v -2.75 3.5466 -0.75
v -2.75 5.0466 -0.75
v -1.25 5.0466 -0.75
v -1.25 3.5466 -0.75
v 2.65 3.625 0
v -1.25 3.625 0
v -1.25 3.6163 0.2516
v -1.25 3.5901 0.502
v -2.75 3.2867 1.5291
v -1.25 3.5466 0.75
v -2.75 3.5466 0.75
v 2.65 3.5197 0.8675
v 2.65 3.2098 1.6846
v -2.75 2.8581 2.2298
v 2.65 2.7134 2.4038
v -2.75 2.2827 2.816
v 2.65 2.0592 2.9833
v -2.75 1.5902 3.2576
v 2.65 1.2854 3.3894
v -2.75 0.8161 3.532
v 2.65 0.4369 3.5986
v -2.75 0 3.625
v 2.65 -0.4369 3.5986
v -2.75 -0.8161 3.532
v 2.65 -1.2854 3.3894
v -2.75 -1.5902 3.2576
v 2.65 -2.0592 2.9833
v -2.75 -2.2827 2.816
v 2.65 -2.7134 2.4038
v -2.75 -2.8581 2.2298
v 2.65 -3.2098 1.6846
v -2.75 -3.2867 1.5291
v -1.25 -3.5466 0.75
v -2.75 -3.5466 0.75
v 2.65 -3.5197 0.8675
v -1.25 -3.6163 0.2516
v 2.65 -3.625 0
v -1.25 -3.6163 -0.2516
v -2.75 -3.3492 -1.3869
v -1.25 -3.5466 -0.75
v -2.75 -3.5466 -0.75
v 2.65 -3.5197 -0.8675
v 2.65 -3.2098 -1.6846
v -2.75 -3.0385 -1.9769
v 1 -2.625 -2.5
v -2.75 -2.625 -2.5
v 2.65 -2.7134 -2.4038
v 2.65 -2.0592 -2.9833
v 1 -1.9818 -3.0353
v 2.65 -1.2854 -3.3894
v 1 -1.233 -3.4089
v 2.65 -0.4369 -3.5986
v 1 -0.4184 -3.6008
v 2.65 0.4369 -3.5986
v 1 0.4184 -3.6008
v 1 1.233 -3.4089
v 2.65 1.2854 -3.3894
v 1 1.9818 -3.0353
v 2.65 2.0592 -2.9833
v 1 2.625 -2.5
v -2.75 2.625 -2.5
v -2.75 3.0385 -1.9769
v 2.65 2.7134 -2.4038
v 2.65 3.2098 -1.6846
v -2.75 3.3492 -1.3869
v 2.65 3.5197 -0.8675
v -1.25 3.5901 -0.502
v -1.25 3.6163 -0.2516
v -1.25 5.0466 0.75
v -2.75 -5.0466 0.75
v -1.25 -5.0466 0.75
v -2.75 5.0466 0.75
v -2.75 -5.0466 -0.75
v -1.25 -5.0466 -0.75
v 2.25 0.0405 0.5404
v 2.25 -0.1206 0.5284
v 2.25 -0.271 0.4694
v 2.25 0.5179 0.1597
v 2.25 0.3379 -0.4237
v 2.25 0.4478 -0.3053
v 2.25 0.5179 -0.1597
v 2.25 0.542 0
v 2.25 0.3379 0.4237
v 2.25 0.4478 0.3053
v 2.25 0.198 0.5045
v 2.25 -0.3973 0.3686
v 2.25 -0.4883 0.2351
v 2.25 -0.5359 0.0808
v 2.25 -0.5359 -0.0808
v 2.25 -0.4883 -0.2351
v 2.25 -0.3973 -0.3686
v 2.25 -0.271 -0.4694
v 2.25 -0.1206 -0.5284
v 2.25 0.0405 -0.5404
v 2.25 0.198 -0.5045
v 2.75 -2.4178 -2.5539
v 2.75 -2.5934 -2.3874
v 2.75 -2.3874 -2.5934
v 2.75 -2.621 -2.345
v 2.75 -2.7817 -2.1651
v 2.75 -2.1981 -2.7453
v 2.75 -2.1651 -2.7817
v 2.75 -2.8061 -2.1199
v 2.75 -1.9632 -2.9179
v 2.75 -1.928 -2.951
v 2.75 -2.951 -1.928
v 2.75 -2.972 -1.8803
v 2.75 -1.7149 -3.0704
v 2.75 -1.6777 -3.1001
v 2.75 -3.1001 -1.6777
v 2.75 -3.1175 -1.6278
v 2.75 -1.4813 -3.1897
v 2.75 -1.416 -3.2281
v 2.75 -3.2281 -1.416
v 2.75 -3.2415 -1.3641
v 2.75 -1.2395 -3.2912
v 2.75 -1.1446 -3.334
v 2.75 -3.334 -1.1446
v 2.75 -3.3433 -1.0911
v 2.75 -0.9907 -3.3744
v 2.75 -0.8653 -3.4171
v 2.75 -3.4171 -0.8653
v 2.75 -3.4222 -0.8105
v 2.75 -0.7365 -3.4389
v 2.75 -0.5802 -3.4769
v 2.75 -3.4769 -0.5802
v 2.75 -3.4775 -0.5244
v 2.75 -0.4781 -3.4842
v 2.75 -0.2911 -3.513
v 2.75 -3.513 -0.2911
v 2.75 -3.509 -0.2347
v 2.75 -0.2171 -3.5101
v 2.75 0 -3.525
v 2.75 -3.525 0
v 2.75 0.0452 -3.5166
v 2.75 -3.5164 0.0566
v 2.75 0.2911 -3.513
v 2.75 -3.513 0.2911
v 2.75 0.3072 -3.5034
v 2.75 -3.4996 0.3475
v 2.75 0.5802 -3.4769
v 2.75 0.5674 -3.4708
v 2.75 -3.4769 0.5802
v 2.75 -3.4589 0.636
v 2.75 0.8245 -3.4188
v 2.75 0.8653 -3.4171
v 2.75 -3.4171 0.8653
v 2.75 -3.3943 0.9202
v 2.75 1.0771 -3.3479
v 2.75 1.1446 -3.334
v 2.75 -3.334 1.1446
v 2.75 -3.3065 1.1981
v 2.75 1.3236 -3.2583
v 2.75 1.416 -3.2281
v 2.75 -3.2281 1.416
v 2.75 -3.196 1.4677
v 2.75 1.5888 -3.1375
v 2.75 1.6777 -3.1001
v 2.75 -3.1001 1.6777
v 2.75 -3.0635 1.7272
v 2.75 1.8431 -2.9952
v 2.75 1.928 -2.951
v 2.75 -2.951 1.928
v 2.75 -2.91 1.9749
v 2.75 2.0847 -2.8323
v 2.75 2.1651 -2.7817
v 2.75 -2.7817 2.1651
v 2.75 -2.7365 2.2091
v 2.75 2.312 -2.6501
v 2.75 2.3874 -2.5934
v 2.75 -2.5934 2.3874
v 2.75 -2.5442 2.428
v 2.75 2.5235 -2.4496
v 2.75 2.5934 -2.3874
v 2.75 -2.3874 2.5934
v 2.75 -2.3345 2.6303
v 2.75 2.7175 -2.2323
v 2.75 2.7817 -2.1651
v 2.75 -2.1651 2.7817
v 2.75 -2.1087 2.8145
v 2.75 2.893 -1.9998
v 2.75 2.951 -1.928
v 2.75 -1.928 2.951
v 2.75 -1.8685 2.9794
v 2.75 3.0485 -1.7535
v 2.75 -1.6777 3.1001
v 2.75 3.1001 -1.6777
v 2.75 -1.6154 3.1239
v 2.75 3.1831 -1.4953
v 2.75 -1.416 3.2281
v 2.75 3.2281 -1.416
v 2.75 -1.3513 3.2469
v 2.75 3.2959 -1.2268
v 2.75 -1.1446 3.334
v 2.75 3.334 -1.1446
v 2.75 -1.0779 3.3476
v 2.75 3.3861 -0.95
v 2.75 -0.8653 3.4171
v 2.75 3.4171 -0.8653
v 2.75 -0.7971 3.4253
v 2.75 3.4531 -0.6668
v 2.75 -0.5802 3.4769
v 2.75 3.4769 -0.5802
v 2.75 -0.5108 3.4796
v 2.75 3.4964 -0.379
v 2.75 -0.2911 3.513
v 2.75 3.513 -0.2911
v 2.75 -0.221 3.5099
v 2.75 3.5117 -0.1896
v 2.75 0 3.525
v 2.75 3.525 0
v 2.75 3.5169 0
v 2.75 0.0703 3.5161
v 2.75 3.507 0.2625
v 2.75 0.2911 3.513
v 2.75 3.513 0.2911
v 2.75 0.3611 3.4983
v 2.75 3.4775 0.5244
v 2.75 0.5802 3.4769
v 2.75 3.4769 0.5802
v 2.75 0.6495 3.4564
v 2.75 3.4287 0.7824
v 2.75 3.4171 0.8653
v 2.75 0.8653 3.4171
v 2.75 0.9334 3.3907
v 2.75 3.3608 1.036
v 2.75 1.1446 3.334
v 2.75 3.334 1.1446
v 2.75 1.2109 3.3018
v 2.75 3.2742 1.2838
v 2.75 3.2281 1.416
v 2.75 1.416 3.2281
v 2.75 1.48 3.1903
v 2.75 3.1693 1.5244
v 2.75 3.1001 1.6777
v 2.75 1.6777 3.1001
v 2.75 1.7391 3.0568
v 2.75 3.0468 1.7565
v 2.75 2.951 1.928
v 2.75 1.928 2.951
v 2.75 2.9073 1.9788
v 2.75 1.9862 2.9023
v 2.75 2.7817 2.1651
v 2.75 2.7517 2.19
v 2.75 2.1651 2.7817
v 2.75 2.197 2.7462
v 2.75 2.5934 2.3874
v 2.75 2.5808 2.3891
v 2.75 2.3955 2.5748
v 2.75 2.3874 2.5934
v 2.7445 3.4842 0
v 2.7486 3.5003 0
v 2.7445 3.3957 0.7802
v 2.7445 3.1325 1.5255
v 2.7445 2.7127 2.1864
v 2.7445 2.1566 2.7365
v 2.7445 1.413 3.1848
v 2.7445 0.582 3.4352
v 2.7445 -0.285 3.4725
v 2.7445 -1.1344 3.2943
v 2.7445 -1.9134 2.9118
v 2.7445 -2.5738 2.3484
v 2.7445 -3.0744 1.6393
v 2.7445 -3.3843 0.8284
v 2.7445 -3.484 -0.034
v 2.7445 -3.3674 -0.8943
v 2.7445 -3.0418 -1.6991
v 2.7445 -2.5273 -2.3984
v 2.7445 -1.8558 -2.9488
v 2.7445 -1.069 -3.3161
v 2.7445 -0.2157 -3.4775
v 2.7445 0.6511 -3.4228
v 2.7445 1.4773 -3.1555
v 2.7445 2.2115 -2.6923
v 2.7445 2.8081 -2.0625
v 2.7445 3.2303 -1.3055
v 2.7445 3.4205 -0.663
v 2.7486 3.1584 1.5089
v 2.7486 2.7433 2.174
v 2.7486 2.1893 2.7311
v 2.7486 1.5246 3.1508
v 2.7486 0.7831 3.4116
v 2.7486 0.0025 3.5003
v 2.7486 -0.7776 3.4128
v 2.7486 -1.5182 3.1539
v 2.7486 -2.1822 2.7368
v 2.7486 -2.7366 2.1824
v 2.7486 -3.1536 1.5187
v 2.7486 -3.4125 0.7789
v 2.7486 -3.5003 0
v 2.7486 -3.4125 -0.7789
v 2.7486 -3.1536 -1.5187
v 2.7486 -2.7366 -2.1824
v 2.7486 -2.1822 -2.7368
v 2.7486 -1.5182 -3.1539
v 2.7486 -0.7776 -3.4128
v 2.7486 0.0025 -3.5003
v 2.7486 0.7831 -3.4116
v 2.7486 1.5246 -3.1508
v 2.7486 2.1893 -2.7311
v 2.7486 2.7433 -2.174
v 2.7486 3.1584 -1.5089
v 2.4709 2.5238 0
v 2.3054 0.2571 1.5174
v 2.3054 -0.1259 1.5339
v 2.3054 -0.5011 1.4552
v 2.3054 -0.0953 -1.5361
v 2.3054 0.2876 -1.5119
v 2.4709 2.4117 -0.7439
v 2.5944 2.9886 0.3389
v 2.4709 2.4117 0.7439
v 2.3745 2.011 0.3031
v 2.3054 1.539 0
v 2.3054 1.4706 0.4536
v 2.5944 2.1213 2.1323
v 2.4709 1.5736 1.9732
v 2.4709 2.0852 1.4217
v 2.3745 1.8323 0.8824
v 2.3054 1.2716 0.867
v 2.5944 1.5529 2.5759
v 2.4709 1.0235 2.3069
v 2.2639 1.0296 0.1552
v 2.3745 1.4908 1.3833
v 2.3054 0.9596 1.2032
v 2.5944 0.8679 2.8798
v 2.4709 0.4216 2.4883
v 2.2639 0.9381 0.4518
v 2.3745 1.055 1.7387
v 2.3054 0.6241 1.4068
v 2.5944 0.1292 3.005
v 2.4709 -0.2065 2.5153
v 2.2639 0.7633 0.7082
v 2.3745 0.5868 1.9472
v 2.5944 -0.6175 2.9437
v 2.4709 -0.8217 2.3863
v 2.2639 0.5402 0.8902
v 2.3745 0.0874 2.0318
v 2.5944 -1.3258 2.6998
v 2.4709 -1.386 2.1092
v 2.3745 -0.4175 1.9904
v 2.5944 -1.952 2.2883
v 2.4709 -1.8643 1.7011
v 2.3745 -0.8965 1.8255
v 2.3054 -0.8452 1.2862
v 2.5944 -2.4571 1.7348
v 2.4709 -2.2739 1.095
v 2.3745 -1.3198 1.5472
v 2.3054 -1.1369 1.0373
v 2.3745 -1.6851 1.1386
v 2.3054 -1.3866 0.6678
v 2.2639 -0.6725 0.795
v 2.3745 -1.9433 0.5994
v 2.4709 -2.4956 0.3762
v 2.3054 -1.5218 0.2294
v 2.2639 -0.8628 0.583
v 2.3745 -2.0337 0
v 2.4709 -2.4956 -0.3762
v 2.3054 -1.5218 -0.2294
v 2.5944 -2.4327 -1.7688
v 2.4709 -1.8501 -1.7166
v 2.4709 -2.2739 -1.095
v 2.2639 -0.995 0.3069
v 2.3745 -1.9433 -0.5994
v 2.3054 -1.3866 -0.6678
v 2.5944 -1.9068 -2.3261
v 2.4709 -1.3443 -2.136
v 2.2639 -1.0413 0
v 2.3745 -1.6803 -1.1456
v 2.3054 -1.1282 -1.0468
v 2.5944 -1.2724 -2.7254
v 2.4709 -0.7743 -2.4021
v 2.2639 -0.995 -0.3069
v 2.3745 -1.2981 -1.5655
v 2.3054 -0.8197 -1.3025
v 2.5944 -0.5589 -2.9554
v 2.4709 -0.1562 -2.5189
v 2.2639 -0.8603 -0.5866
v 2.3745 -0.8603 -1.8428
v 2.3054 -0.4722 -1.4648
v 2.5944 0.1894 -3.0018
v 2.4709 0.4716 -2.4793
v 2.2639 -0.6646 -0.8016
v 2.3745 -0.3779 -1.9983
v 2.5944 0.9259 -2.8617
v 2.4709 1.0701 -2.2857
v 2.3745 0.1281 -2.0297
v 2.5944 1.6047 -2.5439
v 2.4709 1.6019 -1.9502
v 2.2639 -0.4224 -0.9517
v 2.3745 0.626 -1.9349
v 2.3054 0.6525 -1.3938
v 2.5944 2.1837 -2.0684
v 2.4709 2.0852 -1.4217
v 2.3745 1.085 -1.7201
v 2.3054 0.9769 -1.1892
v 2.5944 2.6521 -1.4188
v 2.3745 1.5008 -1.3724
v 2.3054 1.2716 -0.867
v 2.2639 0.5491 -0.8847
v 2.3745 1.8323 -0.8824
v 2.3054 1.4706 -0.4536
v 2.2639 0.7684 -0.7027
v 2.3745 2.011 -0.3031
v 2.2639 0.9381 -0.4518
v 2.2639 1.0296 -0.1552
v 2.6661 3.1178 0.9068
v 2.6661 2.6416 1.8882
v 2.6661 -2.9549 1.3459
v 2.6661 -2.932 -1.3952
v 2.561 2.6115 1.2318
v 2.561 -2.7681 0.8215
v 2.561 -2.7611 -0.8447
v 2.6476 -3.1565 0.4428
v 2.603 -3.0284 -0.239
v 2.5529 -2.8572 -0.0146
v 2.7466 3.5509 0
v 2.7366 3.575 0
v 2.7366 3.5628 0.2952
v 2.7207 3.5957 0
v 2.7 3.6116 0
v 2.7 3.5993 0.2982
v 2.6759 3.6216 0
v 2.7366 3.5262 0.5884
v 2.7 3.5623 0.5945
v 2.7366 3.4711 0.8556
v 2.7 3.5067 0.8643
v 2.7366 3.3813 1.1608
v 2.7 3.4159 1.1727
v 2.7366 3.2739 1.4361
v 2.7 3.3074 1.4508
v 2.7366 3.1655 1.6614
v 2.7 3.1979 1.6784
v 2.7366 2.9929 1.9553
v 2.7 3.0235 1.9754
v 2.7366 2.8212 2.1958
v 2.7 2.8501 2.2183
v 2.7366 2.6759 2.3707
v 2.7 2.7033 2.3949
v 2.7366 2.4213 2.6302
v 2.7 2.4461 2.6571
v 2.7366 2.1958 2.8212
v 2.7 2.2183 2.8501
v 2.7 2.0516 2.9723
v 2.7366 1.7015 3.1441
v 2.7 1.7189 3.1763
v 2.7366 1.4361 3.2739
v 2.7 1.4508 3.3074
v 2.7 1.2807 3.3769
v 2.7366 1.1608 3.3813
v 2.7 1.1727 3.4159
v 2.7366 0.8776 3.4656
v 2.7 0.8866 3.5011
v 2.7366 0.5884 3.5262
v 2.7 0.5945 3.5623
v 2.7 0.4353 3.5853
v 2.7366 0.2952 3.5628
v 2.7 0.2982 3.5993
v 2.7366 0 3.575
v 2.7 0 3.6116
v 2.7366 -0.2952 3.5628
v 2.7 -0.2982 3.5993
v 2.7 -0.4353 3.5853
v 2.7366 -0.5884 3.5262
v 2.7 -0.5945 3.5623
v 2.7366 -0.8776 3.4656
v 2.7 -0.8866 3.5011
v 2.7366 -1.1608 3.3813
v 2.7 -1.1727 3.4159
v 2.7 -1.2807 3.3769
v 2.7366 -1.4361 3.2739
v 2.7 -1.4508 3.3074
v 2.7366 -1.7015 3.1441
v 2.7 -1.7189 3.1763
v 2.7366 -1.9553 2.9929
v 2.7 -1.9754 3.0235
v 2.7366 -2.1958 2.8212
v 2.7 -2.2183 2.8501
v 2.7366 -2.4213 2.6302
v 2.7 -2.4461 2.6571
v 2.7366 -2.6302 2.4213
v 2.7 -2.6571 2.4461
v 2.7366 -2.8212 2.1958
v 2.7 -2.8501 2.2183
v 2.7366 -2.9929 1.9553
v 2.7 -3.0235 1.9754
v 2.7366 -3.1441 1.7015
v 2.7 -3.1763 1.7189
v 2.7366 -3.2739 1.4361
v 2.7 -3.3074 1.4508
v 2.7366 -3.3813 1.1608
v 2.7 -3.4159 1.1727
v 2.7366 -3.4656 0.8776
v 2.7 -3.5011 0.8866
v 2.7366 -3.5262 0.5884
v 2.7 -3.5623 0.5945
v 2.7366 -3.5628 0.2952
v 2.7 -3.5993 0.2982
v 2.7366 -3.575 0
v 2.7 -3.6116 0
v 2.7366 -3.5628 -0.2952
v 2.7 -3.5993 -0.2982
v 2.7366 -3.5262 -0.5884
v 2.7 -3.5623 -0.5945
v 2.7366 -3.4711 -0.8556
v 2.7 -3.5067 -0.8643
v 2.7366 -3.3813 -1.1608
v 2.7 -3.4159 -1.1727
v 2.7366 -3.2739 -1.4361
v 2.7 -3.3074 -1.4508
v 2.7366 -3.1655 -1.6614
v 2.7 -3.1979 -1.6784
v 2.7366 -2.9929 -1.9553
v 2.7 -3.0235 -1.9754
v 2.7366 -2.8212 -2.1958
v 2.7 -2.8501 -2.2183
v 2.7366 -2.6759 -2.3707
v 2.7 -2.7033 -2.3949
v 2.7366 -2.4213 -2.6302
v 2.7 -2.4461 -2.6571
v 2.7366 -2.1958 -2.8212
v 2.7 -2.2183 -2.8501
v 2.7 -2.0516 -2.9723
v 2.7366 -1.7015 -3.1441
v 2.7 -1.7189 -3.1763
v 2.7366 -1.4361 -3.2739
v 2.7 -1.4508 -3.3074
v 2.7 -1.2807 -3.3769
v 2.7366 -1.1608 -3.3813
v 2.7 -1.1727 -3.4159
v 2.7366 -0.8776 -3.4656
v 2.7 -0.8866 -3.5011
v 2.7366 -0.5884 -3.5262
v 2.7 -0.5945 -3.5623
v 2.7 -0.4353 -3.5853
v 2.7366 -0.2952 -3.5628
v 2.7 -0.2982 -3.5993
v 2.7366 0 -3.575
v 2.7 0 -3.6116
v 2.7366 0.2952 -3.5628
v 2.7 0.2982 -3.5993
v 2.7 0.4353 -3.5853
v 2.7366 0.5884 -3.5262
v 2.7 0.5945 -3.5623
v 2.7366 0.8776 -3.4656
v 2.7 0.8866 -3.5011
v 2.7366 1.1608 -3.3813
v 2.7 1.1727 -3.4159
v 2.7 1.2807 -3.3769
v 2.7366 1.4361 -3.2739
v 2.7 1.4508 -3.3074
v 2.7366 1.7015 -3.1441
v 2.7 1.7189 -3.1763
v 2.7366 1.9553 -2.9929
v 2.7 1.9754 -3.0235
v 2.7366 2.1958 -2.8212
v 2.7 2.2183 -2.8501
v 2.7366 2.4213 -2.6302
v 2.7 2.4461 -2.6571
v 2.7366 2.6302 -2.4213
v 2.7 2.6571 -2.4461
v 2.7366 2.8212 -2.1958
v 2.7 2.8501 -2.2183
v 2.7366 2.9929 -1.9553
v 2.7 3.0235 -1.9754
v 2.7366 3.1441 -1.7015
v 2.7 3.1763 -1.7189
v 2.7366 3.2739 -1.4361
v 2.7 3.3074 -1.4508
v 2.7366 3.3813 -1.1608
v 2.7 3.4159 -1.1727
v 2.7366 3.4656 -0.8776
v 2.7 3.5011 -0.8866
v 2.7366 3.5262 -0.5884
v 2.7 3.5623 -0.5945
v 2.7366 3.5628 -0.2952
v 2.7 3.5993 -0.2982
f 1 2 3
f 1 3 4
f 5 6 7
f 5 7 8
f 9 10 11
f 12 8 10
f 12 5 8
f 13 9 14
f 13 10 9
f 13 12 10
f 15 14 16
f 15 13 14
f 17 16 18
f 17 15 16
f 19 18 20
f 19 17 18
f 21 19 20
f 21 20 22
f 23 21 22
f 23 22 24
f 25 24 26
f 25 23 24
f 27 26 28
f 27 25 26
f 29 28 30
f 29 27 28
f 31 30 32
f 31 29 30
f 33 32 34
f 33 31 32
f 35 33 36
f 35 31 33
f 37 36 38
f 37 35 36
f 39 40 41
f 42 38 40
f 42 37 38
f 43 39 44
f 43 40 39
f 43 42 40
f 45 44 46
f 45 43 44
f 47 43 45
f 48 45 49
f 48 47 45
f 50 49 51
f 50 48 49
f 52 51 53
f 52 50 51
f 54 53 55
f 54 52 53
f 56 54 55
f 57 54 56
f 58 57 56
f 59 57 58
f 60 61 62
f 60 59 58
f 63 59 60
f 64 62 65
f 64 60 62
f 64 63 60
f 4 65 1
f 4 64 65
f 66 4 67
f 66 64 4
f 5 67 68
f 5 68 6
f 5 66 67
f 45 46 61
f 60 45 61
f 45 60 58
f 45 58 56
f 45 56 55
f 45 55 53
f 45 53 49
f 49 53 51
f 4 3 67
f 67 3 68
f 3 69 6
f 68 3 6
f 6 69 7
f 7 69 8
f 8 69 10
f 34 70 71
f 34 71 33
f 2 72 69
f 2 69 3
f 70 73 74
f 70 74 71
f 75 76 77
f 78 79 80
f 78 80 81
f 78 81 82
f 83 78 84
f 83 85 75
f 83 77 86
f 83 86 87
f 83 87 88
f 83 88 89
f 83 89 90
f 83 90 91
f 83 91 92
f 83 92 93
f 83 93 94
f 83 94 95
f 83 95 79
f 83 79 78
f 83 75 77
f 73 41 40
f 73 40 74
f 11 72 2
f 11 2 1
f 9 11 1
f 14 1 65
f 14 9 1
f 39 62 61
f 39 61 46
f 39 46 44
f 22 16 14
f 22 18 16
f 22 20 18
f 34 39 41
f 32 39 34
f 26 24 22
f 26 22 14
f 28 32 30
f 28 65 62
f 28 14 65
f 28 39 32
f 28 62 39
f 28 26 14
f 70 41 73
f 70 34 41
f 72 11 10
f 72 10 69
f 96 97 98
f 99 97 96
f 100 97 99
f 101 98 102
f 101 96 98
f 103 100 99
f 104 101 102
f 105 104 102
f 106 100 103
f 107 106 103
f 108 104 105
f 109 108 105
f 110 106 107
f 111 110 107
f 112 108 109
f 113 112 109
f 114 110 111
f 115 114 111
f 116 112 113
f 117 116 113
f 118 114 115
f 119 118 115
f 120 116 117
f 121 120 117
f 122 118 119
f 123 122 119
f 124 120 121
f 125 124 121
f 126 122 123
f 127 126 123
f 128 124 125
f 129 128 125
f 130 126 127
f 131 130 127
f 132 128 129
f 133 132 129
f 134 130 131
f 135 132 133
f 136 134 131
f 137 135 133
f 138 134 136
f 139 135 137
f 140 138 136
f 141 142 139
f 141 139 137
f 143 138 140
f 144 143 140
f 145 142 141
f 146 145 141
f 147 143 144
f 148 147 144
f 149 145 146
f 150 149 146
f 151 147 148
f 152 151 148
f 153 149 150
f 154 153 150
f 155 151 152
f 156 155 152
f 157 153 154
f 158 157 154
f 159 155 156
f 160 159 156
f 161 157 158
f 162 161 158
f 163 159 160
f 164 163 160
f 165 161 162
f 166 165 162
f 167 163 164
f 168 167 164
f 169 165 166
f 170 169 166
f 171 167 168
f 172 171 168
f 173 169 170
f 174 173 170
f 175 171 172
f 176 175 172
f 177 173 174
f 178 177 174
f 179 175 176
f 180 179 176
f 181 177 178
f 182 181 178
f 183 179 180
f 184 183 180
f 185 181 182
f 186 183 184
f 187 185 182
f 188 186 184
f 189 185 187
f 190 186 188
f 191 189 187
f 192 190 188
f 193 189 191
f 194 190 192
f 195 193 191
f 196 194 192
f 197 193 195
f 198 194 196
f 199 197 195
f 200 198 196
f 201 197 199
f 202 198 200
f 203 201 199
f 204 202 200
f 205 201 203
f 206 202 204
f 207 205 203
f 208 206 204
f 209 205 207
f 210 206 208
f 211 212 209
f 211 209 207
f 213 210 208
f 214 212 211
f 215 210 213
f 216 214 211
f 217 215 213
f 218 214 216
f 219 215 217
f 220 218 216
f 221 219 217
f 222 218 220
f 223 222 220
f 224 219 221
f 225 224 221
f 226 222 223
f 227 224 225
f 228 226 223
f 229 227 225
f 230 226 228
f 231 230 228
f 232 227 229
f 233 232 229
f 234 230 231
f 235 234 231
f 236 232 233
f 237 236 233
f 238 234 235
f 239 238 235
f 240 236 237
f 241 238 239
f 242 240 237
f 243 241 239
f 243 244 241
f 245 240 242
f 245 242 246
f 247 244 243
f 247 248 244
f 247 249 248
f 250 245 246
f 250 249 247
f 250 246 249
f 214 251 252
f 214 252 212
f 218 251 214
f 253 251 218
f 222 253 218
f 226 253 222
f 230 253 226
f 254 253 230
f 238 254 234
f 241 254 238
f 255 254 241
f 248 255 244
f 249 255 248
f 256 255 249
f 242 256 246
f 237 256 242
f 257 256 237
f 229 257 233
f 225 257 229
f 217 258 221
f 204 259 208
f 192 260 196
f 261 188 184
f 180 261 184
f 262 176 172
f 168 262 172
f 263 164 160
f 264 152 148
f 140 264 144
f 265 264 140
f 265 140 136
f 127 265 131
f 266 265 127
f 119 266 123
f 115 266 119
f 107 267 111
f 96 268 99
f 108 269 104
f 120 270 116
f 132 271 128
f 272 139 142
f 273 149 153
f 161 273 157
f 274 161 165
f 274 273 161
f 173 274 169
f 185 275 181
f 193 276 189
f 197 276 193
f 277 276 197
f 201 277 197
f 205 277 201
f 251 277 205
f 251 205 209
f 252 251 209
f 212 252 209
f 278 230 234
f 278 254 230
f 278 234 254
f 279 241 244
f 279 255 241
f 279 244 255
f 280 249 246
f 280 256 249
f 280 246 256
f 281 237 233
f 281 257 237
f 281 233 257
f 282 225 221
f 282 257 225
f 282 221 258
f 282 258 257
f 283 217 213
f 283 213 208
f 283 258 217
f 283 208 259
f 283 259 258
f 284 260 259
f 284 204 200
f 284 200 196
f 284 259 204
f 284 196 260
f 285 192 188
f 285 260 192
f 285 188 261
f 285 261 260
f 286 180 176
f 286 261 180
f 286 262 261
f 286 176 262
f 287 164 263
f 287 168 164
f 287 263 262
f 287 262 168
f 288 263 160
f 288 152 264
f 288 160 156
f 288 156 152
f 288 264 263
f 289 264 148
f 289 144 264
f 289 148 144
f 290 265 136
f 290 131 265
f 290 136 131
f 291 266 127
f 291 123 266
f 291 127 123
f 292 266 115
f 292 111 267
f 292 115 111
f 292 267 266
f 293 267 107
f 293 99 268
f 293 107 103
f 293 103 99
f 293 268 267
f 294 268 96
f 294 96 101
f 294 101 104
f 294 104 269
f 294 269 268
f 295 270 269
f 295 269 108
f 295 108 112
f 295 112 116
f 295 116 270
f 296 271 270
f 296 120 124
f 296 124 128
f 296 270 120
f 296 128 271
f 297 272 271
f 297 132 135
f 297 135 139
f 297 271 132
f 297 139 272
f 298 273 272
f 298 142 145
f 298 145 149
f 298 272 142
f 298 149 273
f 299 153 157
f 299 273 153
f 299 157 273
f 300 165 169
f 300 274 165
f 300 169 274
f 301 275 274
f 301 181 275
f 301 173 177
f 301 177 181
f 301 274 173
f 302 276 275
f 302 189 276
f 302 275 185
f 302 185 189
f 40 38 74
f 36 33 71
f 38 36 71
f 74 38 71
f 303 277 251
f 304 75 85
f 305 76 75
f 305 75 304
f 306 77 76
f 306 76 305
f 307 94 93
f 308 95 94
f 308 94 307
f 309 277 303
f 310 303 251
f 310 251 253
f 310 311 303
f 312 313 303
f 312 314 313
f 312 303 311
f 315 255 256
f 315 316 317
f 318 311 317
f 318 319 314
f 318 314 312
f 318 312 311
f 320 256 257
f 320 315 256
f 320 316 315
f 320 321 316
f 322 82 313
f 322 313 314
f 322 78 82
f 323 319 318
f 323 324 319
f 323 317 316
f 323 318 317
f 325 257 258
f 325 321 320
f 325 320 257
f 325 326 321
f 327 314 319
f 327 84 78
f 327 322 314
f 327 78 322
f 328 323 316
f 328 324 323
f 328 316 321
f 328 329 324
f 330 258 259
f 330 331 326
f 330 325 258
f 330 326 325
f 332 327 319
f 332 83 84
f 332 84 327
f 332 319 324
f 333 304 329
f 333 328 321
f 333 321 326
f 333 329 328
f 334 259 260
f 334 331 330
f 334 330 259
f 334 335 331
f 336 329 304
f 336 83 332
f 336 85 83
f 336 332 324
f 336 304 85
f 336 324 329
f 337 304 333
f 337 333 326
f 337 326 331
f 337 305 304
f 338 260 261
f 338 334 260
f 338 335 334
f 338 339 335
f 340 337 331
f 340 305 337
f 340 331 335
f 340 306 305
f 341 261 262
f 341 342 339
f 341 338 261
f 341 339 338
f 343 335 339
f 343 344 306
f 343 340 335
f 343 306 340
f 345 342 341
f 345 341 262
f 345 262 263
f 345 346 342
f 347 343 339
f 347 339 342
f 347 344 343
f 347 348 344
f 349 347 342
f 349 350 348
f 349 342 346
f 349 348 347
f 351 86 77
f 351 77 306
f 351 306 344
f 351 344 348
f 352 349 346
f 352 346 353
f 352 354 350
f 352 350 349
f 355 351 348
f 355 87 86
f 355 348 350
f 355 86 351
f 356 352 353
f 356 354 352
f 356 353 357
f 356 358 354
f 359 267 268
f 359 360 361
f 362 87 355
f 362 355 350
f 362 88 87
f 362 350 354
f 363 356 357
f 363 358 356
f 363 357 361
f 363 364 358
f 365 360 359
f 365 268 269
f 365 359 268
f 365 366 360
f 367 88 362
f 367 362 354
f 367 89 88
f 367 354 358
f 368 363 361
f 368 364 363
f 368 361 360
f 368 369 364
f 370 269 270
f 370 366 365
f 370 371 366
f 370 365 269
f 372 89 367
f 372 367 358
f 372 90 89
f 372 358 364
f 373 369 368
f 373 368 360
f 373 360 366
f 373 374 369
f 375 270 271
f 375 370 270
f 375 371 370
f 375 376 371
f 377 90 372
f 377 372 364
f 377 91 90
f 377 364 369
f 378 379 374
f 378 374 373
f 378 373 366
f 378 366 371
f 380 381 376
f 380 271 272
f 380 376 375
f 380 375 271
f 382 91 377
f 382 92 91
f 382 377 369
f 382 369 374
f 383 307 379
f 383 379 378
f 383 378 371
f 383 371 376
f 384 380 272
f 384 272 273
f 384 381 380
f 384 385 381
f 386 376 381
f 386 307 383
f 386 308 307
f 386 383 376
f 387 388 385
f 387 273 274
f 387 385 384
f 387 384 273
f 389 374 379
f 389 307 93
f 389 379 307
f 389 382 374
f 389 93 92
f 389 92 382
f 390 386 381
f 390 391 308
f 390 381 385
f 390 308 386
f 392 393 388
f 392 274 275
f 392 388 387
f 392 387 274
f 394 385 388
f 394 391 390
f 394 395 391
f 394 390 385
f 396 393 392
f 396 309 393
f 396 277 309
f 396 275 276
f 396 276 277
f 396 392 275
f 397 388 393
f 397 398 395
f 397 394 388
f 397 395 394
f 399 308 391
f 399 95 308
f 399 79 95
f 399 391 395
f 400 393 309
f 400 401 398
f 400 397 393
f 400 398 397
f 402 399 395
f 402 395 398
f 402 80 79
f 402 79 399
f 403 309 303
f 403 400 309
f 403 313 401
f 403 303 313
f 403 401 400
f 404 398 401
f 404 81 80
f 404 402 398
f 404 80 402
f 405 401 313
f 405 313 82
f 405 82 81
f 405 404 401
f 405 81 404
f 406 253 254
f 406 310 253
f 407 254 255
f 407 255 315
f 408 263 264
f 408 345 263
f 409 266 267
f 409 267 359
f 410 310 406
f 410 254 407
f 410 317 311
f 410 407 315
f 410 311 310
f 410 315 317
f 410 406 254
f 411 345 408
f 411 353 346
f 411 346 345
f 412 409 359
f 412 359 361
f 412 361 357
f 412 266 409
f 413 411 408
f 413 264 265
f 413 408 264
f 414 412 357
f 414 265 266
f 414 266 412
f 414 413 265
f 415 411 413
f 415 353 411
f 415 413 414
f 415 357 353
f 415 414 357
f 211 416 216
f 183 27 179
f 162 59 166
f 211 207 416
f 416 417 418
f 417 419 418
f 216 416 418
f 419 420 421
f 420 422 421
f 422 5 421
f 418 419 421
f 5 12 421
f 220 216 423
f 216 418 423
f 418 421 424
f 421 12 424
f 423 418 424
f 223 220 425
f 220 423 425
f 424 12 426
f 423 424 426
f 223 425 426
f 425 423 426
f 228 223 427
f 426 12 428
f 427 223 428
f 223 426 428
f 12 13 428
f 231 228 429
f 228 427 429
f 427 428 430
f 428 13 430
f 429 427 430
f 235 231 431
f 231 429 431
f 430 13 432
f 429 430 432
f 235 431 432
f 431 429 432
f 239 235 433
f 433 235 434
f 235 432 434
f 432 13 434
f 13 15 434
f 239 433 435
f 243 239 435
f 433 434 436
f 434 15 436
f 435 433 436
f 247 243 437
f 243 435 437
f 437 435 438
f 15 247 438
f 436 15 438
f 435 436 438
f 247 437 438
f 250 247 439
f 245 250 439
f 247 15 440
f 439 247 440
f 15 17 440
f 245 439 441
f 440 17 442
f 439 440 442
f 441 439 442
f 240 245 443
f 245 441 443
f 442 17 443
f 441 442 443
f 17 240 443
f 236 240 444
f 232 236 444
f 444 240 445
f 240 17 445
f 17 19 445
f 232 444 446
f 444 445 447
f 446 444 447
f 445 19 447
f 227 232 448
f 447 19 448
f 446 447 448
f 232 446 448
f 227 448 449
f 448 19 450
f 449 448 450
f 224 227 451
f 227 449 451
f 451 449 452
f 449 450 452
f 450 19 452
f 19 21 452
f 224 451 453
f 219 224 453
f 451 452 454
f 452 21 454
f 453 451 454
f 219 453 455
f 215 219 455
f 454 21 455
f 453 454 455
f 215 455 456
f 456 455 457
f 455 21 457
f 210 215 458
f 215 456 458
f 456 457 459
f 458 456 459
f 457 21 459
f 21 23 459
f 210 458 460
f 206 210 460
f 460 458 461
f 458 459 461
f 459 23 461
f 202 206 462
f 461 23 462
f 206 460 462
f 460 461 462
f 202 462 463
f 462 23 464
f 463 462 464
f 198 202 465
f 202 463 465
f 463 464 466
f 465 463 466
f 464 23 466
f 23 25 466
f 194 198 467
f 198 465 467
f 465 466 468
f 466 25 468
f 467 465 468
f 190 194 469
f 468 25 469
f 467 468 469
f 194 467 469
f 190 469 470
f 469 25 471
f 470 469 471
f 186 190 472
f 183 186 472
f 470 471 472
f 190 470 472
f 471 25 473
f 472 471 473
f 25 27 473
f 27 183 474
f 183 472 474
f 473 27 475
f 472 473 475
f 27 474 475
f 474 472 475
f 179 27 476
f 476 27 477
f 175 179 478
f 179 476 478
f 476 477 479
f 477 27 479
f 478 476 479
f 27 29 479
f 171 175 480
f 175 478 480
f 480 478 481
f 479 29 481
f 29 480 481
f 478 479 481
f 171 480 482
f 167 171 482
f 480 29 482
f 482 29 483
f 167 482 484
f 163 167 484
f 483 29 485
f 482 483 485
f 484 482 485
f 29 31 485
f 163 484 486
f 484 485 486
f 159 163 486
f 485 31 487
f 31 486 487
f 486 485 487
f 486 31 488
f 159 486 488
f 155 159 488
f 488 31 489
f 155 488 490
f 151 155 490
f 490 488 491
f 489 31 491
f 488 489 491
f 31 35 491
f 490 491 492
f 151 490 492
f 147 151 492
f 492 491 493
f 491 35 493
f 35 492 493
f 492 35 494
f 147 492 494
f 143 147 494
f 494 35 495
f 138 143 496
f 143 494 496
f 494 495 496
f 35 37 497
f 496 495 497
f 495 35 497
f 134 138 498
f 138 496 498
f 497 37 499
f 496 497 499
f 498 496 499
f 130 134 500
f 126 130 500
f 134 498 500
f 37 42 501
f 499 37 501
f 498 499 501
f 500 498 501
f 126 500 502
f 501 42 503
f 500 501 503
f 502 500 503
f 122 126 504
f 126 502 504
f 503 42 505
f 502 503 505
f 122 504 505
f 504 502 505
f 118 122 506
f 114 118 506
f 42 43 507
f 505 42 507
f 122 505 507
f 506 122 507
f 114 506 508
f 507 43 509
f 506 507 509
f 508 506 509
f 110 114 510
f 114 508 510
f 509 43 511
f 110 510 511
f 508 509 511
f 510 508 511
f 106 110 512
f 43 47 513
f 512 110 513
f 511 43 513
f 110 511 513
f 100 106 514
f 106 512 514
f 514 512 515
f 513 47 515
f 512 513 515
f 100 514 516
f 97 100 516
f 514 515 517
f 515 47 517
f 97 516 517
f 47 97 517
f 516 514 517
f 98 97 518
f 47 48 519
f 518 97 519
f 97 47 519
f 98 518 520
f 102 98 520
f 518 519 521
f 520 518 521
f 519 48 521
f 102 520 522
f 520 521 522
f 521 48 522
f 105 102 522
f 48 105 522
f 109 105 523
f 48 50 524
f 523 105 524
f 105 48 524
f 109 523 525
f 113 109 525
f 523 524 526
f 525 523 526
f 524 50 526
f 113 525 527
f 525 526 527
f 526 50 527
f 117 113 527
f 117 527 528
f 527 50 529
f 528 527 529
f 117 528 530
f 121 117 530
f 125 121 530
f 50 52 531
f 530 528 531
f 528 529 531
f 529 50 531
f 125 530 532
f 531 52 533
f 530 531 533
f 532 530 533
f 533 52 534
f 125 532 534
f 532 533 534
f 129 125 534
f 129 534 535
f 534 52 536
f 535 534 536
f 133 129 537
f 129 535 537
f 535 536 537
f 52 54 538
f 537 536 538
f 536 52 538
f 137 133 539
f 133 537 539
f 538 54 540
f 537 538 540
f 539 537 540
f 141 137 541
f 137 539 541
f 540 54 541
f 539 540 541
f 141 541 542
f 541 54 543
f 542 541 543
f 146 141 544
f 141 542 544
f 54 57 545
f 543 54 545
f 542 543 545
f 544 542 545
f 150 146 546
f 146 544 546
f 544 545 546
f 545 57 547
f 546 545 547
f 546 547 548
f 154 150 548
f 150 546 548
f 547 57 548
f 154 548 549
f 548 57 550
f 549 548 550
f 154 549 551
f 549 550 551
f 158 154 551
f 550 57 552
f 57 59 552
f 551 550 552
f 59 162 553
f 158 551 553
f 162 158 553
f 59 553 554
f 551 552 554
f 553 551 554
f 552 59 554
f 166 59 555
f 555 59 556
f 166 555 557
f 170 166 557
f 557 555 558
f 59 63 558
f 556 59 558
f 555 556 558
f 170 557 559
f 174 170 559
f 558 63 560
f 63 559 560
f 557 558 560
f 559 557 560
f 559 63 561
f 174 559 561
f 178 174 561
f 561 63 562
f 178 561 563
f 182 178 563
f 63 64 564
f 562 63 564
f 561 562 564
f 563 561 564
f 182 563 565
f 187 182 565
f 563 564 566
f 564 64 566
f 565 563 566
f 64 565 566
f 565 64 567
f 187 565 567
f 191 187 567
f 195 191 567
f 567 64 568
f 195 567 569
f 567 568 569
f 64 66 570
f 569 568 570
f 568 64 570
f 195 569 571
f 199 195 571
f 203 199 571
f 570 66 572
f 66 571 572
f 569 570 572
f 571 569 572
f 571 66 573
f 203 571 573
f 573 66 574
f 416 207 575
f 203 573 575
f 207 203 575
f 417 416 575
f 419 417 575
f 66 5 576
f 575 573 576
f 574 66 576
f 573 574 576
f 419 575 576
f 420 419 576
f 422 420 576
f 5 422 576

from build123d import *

# Parameters (mm, degrees)
F0_R     = 3.625
F1_DEPTH = 2.75
F3_DEPTH = 1.5
F4_R     = 3.5
F5_DEPTH = 0.5
F7_DEPTH = 3.75
F9_R     = 0.1


# Not quite as in the source:
# - a fillet or chamfer that OpenCascade refuses, or shapes differently, is made with other operations: its cross-section is extruded or revolved along the edge and cut away or added


with BuildPart() as f1:
    # F0 (on Right) → F1 (new body, symmetric)
    with BuildSketch(Plane.YZ):
        Circle(F0_R)
    extrude(amount=F1_DEPTH, both=True)

    # F2 (on face) → F3 (join)
    with BuildSketch(Plane(origin=(-2.75, 0, 0), x_dir=(0, -1, 0), z_dir=(-1, 0, 0))):
        with BuildLine():
            Line((3.5465652398, -0.75), (5.0465652398, -0.75))
            Line((5.0465652398, -0.75), (5.0465652398, 0.75))
            Line((5.0465652398, 0.75), (3.5465652398, 0.75))
            ThreePointArc((3.5465652398, 0.75), (3.625, 0), (3.5465652398, -0.75))
        make_face()
        with BuildLine():
            Line((-3.5465652398, 0.75), (-5.0465652398, 0.75))
            Line((-5.0465652398, 0.75), (-5.0465652398, -0.75))
            Line((-5.0465652398, -0.75), (-3.5465652398, -0.75))
            ThreePointArc((-3.5465652398, -0.75), (-3.625, 0), (-3.5465652398, 0.75))
        make_face()
    extrude(amount=-F3_DEPTH)

    # F4 (on face) → F5 (cut)
    with BuildSketch(Plane.YZ.offset(2.75)):
        Circle(F4_R)
    extrude(amount=-F5_DEPTH, mode=Mode.SUBTRACT)

    # F6 (on face) → F7 (cut)
    with BuildSketch(Plane(origin=(-2.75, 0, 0), x_dir=(0, -1, 0), z_dir=(-1, 0, 0))):
        with BuildLine():
            Line((2.625, -2.5), (-2.625, -2.5))
            ThreePointArc((-2.625, -2.5), (0, -3.625), (2.625, -2.5))
        make_face()
    extrude(amount=-F7_DEPTH, mode=Mode.SUBTRACT)

    # F8: fillet of radius 9 on 1 edges, made by hand

    # F8_s1 → F8_t2 (revolve)
    with BuildSketch(Plane.XY):
        with BuildLine():
            ThreePointArc((2.75, 3.5), (2.3758803254, 2.0419601084), (2.25, 0.5419601084))
            Line((2.25, 0.5419601084), (2.25, 3.5))
            Line((2.25, 3.5), (2.75, 3.5))
        make_face()
    revolve(axis=Axis((2.25, 0, 0), (1, 0, 0)))

    # F9
    f9_edges = [f1.edges().sort_by_distance(p)[0] for p in [
        (2.75, -3.5, 0),
        (2.75, -3.625, 0),
    ]]
    fillet(f9_edges, radius=F9_R)


solid = f1.part
